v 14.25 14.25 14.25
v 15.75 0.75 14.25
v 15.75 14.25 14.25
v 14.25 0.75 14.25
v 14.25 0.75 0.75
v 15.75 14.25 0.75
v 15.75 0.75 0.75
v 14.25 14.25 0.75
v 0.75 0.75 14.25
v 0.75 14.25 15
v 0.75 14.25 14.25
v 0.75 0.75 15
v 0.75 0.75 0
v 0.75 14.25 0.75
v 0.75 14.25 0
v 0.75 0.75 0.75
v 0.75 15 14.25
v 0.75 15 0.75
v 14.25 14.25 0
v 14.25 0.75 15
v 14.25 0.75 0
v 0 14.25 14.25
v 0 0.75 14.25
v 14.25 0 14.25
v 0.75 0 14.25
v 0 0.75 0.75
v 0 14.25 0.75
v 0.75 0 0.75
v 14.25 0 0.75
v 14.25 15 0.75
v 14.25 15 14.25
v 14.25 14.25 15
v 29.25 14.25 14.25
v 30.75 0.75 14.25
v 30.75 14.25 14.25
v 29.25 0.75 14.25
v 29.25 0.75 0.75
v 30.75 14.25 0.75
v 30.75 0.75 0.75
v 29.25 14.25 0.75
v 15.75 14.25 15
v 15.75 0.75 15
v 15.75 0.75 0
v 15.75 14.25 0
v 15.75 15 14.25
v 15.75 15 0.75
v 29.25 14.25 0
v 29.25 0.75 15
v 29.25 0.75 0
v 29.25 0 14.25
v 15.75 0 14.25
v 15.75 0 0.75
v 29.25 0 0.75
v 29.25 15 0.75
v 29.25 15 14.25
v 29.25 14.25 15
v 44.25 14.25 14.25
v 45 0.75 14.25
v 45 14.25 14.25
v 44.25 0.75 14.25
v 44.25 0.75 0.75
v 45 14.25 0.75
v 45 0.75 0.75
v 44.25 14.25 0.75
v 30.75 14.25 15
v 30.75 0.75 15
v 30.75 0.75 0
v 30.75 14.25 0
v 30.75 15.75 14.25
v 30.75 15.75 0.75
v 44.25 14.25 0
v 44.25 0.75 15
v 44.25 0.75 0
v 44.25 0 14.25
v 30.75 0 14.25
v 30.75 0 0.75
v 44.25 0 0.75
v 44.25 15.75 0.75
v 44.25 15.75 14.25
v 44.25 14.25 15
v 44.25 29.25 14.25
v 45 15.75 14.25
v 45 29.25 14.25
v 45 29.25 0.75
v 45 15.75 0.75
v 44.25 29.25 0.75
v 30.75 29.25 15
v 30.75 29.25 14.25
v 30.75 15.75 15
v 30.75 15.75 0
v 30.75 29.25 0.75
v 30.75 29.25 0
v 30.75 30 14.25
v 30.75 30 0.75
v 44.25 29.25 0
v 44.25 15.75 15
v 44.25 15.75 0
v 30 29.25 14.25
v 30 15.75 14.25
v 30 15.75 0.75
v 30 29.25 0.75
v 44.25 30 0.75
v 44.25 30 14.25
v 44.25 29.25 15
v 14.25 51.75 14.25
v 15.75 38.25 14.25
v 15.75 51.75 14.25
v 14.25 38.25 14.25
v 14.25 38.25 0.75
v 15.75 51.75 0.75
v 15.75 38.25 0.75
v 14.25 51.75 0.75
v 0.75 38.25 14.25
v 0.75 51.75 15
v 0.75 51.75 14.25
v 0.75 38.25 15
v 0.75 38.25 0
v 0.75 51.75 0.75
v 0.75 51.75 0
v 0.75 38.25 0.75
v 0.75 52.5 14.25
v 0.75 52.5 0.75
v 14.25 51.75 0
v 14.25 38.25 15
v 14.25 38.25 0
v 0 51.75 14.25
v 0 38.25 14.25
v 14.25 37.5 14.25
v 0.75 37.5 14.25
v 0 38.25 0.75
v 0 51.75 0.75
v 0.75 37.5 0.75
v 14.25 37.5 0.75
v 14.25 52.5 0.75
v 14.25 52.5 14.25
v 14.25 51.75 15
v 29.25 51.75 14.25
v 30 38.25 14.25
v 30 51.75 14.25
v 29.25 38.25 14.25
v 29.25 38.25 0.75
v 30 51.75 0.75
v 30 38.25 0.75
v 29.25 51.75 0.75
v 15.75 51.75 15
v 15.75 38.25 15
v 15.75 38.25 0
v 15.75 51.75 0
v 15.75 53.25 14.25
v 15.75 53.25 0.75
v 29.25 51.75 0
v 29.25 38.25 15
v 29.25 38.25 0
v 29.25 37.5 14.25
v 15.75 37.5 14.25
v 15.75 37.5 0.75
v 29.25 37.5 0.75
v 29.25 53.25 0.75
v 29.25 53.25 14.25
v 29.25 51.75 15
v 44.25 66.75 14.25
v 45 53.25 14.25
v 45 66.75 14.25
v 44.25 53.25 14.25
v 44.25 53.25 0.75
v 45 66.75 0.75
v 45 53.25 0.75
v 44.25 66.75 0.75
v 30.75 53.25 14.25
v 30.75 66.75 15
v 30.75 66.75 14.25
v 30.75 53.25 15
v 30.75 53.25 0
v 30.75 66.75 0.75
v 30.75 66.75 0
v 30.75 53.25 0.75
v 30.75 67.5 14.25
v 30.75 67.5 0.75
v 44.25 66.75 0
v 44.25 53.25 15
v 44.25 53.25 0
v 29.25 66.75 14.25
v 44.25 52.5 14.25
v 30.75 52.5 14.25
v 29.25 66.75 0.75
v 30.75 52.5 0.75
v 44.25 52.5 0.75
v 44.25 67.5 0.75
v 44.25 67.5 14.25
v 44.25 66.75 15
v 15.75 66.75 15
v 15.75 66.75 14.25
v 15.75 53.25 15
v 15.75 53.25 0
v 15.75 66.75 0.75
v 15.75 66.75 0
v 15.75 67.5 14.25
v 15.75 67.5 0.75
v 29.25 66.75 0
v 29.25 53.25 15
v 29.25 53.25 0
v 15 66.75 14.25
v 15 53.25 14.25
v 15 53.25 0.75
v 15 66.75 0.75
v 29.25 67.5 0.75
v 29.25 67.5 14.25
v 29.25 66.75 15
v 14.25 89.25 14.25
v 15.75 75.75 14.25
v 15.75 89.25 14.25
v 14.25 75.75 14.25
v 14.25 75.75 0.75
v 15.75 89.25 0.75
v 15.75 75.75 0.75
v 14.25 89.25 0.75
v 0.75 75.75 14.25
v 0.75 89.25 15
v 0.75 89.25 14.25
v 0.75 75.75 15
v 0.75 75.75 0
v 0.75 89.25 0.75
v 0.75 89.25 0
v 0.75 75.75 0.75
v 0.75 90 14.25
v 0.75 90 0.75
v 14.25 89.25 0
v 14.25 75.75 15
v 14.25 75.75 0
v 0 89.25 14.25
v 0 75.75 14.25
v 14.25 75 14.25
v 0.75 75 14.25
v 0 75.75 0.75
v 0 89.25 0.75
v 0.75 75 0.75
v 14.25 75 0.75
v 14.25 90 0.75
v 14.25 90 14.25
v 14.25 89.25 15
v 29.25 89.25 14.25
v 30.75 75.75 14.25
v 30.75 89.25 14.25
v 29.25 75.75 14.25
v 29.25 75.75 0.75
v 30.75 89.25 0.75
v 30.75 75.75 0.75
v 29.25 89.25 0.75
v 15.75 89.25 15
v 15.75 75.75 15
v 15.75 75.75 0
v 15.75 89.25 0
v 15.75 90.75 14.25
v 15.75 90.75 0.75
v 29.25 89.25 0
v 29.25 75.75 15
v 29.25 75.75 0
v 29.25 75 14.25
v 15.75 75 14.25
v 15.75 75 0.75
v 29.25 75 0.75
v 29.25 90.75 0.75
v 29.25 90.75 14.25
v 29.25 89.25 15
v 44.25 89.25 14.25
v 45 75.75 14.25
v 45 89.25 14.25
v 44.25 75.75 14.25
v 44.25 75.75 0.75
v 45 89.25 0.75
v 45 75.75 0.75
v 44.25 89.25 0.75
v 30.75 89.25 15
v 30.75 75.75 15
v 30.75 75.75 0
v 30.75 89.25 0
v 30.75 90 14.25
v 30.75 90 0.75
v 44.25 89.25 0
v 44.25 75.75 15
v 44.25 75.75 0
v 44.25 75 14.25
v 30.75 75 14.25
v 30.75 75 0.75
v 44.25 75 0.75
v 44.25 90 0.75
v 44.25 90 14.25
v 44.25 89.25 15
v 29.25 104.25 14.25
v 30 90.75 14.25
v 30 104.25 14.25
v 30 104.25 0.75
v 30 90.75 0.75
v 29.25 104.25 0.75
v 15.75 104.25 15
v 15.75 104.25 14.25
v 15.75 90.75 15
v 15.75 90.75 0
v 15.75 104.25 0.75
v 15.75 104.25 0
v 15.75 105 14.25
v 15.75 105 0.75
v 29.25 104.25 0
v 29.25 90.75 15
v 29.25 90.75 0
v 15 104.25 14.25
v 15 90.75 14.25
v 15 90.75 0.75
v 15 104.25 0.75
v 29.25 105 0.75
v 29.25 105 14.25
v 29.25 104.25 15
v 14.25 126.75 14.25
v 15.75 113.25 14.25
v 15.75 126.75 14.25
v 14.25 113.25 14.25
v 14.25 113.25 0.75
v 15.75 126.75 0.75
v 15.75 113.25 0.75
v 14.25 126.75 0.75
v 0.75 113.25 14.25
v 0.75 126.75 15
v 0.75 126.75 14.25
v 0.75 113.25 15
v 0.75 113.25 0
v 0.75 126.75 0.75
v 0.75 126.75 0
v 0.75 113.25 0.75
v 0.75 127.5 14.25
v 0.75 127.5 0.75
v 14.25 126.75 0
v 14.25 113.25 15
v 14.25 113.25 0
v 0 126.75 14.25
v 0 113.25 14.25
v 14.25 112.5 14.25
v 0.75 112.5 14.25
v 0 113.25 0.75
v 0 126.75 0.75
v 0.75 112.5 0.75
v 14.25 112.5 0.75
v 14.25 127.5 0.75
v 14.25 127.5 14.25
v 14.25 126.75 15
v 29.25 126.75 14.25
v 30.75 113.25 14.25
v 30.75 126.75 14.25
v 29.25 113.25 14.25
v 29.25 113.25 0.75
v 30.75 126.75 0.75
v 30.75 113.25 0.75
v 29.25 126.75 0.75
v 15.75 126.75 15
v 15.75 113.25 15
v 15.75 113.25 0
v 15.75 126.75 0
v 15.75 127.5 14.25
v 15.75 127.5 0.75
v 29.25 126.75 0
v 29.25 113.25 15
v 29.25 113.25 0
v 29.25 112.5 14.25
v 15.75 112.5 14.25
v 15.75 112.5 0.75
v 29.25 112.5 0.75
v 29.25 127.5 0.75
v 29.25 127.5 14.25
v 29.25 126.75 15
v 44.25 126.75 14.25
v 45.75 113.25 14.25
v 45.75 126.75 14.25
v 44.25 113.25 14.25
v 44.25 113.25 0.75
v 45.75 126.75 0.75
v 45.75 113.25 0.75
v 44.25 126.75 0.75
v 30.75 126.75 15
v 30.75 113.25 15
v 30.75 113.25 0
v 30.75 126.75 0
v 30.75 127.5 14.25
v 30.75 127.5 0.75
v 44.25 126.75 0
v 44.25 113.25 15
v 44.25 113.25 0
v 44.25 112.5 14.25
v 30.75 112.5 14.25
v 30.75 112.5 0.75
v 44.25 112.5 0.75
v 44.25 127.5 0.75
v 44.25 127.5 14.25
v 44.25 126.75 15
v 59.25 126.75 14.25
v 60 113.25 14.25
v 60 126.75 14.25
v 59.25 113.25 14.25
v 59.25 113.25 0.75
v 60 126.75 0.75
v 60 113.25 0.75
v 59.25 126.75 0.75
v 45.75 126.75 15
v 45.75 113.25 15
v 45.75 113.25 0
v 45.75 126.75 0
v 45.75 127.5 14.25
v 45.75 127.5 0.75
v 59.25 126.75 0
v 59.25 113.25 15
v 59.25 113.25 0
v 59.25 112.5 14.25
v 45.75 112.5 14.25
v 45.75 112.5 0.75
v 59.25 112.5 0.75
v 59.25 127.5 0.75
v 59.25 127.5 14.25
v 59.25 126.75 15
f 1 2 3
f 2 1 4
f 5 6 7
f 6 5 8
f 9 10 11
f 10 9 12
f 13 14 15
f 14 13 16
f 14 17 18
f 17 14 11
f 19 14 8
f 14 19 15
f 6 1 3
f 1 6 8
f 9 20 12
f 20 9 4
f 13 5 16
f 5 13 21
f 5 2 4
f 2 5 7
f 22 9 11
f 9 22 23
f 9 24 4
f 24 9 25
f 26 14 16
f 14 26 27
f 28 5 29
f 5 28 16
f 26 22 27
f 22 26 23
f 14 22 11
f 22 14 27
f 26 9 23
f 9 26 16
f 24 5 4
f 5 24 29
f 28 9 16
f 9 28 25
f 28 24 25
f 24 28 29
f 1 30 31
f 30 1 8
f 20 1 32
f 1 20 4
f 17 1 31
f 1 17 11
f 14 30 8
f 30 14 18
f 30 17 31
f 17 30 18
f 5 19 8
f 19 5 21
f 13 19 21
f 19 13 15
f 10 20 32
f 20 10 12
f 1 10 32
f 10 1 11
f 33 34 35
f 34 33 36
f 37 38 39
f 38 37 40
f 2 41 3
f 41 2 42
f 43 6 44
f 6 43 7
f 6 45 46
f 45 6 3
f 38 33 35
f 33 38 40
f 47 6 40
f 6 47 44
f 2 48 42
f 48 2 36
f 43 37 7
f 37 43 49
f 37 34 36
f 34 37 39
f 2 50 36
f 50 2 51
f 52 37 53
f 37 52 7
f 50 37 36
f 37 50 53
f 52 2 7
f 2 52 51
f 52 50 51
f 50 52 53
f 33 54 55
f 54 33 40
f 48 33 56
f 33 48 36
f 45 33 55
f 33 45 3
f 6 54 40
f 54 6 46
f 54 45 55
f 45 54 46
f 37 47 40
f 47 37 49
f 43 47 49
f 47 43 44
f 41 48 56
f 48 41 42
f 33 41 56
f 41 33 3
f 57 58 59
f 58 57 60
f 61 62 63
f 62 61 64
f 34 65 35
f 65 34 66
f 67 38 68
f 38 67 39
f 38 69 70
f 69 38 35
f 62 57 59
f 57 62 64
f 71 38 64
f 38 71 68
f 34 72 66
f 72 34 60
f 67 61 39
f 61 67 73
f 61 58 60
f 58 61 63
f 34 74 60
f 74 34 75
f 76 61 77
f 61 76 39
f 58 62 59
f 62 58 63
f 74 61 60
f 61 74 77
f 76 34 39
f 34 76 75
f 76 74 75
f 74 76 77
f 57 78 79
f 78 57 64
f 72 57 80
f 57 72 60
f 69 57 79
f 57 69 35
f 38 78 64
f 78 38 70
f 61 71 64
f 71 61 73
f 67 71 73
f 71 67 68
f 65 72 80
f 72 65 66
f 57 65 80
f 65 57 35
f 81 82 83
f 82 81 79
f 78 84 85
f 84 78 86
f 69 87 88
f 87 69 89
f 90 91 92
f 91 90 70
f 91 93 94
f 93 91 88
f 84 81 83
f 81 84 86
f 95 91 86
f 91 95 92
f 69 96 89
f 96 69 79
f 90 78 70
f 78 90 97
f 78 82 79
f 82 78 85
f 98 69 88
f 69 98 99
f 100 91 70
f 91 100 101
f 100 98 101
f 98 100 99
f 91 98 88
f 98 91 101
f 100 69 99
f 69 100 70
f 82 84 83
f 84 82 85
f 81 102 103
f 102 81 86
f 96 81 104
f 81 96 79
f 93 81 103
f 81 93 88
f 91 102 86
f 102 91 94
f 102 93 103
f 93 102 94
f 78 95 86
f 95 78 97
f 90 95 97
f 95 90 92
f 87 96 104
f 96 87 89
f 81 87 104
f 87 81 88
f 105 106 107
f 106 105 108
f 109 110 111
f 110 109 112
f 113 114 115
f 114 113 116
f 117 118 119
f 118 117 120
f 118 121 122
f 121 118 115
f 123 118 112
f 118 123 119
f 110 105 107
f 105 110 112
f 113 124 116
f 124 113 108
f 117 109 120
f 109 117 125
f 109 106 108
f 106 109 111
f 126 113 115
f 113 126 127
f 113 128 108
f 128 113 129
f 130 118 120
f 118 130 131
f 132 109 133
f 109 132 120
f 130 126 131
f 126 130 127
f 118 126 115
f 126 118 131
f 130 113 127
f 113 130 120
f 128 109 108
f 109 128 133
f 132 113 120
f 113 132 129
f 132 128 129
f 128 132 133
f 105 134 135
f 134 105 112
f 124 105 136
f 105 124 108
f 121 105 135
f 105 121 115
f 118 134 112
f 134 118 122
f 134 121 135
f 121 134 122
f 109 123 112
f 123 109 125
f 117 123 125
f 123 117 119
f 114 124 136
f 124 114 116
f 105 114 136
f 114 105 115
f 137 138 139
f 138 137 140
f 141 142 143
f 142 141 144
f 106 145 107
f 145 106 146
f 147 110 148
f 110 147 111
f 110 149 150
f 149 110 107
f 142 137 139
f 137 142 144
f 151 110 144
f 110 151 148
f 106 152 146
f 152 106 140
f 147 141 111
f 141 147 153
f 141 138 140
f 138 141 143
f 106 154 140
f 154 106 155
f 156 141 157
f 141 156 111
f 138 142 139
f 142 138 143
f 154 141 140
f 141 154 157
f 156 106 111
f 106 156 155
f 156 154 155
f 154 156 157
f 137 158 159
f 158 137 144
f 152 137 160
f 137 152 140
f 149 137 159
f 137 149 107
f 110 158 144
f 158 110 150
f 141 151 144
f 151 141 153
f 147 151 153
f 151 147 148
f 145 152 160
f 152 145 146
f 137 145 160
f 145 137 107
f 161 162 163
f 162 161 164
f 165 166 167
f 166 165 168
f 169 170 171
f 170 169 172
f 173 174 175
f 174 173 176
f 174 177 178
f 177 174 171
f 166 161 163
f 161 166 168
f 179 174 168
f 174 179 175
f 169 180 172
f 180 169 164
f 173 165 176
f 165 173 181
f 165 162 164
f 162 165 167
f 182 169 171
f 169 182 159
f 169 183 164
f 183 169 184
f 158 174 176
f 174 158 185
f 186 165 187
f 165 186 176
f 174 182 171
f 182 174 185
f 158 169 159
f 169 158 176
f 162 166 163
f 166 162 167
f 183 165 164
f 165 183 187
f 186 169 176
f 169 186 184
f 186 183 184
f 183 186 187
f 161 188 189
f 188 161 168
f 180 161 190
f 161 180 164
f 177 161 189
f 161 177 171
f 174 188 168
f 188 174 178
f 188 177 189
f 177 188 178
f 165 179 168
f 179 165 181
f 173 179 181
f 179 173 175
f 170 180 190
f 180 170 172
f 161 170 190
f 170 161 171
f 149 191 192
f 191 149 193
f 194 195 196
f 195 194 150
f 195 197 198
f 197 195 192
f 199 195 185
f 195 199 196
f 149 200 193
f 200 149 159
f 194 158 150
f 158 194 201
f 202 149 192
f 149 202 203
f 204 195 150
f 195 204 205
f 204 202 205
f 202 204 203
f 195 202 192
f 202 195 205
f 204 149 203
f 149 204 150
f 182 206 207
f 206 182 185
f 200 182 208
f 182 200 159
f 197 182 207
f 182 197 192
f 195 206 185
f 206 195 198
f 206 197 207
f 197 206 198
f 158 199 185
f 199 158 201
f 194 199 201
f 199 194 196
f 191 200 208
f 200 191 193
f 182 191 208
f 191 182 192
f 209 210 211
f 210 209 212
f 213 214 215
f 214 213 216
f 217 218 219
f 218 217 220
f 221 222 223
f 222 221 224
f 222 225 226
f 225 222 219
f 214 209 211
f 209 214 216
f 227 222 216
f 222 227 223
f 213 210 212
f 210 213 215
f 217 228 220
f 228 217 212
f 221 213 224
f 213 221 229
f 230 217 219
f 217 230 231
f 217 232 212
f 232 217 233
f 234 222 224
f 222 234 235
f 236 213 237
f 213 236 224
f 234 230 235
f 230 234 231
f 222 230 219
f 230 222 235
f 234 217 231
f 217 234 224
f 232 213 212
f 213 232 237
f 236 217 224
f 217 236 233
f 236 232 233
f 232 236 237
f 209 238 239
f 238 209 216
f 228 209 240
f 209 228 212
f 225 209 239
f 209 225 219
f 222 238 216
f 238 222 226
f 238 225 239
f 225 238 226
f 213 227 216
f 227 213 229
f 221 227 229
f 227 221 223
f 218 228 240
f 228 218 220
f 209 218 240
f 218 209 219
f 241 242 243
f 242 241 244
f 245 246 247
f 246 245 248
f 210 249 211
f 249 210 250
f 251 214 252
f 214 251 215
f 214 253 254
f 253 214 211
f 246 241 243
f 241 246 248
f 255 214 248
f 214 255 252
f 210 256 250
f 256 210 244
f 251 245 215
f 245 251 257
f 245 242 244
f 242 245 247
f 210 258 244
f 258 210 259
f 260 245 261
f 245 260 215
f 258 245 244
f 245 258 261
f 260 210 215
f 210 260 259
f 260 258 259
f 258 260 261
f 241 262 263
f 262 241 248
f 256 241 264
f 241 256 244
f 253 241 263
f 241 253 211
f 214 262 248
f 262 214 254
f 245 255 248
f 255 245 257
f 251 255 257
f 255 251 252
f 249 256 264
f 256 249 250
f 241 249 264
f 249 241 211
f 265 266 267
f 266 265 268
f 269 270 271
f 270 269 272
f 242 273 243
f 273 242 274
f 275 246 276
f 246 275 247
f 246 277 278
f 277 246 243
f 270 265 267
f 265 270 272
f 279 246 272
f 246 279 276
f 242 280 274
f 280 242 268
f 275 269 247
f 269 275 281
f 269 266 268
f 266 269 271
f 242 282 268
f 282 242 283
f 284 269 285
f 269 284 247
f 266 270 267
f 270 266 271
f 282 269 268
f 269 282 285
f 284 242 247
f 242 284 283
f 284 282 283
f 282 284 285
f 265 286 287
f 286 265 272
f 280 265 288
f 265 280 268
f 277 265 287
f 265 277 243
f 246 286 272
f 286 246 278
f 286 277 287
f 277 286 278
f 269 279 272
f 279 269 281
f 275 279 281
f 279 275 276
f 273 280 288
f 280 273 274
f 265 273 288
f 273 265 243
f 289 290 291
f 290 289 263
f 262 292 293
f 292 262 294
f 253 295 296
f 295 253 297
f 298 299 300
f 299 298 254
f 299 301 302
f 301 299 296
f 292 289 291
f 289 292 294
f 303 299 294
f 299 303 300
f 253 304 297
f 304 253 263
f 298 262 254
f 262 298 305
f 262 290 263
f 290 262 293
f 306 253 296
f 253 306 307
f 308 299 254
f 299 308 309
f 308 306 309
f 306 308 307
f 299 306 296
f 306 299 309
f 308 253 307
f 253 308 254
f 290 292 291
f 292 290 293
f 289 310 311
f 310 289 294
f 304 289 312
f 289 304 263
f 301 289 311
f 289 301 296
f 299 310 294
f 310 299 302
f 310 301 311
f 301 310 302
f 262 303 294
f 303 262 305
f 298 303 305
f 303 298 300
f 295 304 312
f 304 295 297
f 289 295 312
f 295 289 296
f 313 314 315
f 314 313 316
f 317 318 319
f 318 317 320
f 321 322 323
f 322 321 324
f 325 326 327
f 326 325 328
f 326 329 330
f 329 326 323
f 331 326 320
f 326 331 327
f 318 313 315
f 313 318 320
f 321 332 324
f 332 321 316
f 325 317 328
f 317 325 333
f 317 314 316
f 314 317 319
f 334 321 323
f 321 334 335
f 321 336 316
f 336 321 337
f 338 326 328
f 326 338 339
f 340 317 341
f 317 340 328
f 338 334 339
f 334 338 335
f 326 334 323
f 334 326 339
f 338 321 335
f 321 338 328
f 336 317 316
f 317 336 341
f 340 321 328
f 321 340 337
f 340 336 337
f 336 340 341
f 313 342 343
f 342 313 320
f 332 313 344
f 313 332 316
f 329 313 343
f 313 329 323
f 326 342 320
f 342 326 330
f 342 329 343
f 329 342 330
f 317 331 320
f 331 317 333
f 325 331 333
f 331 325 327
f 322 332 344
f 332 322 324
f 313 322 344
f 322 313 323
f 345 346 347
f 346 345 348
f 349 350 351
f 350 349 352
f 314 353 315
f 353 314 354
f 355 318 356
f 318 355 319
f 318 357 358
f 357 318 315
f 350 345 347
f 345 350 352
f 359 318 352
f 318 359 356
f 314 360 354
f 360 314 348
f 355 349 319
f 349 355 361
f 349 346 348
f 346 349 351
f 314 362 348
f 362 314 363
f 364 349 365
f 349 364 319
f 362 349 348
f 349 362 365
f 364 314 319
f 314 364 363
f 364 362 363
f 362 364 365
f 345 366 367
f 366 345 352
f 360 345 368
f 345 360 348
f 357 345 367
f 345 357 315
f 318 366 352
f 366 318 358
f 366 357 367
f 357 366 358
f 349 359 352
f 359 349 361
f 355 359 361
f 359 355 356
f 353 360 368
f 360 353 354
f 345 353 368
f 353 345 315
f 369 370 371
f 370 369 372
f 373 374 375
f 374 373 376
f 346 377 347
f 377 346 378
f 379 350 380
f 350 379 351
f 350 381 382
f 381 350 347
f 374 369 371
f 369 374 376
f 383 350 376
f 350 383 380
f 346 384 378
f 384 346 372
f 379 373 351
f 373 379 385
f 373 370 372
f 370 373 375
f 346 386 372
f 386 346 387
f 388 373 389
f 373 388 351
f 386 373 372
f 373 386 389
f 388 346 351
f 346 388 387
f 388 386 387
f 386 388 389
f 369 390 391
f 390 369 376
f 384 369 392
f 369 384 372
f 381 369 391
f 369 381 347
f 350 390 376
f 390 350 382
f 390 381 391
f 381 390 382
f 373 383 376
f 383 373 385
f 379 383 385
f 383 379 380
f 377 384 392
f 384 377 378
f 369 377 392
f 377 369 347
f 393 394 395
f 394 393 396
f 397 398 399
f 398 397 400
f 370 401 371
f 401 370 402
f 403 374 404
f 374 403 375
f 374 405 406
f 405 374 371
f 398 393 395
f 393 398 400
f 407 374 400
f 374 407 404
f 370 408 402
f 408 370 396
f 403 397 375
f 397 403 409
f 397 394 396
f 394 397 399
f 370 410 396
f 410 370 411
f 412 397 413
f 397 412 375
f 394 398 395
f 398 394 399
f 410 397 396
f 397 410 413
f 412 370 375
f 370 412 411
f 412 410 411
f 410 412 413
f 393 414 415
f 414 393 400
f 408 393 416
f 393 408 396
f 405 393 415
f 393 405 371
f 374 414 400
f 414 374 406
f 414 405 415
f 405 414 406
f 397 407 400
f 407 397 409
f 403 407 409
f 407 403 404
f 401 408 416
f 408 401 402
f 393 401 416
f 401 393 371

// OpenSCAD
module L(size) {
  union() {
    Block(size);
    translate([size,0,0]) Block(size);
    translate([size*2,0,0]) Block(size);
    translate([size*2,size,0]) Block(size);
  }
}

module Line(size) {
  union() {
    Block(size);
    translate([size,0,0]) Block(size);
    translate([size*2,0,0]) Block(size);
    translate([size*3,0,0]) Block(size);
  }
}

// you don't need the 'other' s since you can flip it in 3d
module S(size) {
  union() {
    Block(size);
    translate([size,0,0]) Block(size);
    translate([size,size,0]) Block(size);
    translate([size*2,size,0]) Block(size);
  }
}

module T(size) {
  union() {
    Block(size);
    translate([size,0,0]) Block(size);
    translate([size,size,0]) Block(size);
    translate([size*2,0,0]) Block(size);
  }
}

module Block(size) {
  delta = size/20;
  subblock = size-(2*delta);
  union() {
    translate([delta,   delta,   delta  ]) cube([subblock, subblock, subblock]);
    translate([0,       delta,   delta  ]) cube([subblock, subblock, subblock]);
    translate([2*delta, delta,   delta  ]) cube([subblock, subblock, subblock]);
    translate([delta,   0,       delta  ]) cube([subblock, subblock, subblock]);
    translate([delta,   2*delta, delta  ]) cube([subblock, subblock, subblock]);
    translate([delta,   delta,   0      ]) cube([subblock, subblock, subblock]);
    translate([delta,   delta,   2*delta]) cube([subblock, subblock, subblock]);
  }
}

module Set(size) {
  L(size);
  translate([0, size*2.5,0]) S(size);
  translate([0, size*5,0]) T(size);
  translate([0, size*7.5,0]) Line(size);
}

Set(15);
